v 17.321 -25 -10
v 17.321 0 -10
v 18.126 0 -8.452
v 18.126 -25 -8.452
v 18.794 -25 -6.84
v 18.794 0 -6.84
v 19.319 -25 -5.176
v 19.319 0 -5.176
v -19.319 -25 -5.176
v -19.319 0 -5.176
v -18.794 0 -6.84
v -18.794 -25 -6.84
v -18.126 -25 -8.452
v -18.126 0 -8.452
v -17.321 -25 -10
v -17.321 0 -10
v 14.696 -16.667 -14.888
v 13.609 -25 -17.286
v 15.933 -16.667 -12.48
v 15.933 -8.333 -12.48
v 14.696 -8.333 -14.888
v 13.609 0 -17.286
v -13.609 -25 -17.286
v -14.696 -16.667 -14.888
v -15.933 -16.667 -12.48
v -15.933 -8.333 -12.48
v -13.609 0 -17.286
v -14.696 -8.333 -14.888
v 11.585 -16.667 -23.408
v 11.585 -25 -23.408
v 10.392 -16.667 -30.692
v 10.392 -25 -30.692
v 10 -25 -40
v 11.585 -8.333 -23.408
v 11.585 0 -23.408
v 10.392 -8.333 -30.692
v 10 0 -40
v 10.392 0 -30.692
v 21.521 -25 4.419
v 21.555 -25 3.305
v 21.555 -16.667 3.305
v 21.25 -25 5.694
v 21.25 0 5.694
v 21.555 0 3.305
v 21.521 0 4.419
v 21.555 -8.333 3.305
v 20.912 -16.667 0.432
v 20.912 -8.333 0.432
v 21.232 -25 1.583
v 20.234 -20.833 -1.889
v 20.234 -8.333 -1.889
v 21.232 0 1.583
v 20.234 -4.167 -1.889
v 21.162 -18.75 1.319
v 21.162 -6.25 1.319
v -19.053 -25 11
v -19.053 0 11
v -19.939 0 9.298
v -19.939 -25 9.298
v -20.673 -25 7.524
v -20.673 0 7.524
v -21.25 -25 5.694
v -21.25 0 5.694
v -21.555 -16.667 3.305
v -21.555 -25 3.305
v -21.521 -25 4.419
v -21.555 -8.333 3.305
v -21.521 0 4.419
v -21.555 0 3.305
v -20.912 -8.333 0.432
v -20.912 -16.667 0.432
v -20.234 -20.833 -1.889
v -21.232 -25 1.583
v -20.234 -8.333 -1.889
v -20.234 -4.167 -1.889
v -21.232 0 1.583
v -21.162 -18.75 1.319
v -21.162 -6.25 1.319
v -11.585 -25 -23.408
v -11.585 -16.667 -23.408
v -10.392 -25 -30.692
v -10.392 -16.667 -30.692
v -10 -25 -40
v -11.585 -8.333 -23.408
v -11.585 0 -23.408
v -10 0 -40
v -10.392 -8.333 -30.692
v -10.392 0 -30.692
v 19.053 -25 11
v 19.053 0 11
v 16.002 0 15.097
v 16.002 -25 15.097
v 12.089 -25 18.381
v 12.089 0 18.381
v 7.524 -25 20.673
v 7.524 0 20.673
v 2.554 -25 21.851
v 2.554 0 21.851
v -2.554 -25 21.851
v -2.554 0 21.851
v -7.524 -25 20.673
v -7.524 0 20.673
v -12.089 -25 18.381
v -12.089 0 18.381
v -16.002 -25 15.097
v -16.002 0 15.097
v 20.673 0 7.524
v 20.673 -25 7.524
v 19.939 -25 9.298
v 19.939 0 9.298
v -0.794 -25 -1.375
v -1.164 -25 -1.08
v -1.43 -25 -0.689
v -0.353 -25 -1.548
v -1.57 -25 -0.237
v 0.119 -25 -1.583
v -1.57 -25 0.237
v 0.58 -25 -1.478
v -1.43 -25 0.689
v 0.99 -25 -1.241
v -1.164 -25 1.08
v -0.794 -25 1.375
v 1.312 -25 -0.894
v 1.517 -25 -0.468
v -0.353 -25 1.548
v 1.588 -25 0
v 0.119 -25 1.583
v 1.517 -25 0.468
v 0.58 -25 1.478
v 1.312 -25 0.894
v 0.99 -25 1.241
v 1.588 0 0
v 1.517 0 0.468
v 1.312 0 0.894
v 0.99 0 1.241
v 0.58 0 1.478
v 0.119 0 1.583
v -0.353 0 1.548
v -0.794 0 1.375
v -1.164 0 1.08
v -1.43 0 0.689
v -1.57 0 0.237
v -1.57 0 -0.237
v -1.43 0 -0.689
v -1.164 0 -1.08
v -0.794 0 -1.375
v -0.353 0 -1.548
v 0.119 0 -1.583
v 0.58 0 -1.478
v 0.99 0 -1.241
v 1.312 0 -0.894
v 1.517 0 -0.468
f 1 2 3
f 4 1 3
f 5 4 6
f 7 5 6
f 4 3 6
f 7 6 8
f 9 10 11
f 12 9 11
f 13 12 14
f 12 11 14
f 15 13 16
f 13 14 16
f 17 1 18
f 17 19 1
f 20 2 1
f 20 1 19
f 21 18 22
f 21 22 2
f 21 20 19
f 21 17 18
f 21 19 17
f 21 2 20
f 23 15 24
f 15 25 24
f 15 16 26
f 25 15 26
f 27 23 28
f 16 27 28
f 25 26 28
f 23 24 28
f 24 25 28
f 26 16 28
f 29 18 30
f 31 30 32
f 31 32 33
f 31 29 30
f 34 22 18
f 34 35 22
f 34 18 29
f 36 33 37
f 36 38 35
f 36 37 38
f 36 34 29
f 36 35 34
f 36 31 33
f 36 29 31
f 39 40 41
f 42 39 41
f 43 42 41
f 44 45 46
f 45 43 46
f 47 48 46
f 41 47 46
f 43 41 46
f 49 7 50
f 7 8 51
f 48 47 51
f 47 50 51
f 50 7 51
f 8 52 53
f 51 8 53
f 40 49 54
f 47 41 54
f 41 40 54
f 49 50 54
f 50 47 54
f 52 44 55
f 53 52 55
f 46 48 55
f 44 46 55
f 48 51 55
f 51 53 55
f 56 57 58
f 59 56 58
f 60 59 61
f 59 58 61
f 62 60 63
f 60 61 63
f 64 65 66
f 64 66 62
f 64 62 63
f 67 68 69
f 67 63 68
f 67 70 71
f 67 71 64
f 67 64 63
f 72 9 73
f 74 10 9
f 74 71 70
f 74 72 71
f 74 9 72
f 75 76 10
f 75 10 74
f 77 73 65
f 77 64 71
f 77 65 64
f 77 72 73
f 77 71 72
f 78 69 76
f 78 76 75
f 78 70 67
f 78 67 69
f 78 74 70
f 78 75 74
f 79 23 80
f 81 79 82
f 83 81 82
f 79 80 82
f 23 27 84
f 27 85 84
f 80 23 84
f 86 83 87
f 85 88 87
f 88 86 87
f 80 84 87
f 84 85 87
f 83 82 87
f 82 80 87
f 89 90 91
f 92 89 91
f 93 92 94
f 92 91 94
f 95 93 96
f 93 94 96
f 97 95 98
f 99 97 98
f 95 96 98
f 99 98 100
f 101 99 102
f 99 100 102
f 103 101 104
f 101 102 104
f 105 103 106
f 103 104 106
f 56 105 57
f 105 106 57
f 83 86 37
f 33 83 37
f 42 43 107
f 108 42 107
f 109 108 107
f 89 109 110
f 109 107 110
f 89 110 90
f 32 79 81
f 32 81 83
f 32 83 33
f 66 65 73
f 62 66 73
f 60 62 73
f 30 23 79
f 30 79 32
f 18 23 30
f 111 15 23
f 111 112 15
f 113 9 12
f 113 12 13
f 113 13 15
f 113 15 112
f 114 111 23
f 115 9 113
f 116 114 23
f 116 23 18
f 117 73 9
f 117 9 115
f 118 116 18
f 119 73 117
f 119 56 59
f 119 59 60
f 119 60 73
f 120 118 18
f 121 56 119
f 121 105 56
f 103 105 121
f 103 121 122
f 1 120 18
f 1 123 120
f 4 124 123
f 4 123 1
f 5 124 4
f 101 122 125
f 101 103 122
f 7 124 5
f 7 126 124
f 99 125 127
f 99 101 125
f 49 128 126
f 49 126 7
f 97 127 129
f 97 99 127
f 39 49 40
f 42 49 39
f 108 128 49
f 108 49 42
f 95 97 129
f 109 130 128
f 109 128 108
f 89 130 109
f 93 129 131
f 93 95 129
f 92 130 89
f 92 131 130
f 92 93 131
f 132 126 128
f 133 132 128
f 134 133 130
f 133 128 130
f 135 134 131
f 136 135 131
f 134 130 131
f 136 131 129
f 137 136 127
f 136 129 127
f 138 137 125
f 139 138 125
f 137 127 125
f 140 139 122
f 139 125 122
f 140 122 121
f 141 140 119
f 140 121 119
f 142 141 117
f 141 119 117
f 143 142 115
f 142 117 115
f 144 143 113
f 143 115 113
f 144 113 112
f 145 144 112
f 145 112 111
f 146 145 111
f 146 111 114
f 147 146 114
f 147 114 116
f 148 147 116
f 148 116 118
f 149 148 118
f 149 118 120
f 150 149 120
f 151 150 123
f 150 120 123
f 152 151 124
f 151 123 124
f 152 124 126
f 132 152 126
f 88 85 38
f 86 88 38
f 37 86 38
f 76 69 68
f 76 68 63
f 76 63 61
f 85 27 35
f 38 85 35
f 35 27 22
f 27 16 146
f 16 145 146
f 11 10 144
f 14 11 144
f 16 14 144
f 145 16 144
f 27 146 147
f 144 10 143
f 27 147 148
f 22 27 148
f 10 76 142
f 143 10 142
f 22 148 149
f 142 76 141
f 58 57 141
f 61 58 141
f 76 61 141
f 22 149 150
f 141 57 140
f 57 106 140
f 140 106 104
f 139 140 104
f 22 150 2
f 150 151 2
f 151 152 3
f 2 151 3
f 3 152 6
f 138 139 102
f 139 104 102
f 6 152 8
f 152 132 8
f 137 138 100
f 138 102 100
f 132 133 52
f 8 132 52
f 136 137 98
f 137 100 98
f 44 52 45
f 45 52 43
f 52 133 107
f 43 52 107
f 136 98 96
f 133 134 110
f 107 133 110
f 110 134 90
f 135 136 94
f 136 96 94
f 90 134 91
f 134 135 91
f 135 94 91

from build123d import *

# Parameters (mm, degrees)
F1_DEPTH = 25
F2_R     = 1.5875
F3_DEPTH = 25


with BuildPart() as f1:
    # F0 (on Front) → F1 (new body)
    with BuildSketch(Plane.XZ):
        with BuildLine():
            Line((-17.3205080757, 10), (0, 0))
            Line((0, 0), (17.3205080757, 10))
            ThreePointArc((17.3205080757, 10), (0, 20), (-17.3205080757, 10))
        make_face()
        with BuildLine():
            ThreePointArc((19.0525588833, 11), (0, 22), (-19.0525588833, 11))
            Line((-19.0525588833, 11), (-17.3205080757, 10))
            ThreePointArc((-17.3205080757, 10), (0, 20), (17.3205080757, 10))
            Line((17.3205080757, 10), (19.0525588833, 11))
        make_face()
        with BuildLine():
            Line((19.3185165258, 5.1763809021), (21.2503681784, 5.6940189923))
            ThreePointArc((21.2503681784, 5.6940189923), (20.3253497152, 8.419035512), (19.0525588833, 11))
            Line((19.0525588833, 11), (17.3205080757, 10))
            ThreePointArc((17.3205080757, 10), (18.4775906502, 7.6536686473), (19.3185165258, 5.1763809021))
        make_face()
        with BuildLine():
            Line((17.3205080757, 10), (0, 0))
            Line((0, 0), (19.3185165258, 5.1763809021))
            ThreePointArc((19.3185165258, 5.1763809021), (18.4775906502, 7.6536686473), (17.3205080757, 10))
        make_face()
        with BuildLine():
            Line((0, 0), (19.3185165258, -5.1763809021))
            ThreePointArc((19.3185165258, -5.1763809021), (19.8288972275, -2.6105238444), (20, 0))
            ThreePointArc((20, 0), (19.8288972275, 2.6105238444), (19.3185165258, 5.1763809021))
            Line((19.3185165258, 5.1763809021), (0, 0))
        make_face()
        with BuildLine():
            add(Edge.make_bspline(
                [(19.3185165258, -5.1763809021), (21.3890688866, 2.5510257083), (22.0268253137, 2.7962415134), (21.2503681784, 5.6940189923)],
                knots=[0, 0, 0, 0, 11.0407266369, 11.0407266369, 11.0407266369, 11.0407266369], degree=3))
            Line((21.2503681784, 5.6940189923), (19.3185165258, 5.1763809021))
            ThreePointArc((19.3185165258, 5.1763809021), (19.8288972275, 2.6105238444), (20, 0))
            ThreePointArc((20, 0), (19.8288972275, -2.6105238444), (19.3185165258, -5.1763809021))
        make_face()
        with BuildLine():
            Line((0, 0), (17.3205080757, -10))
            ThreePointArc((17.3205080757, -10), (18.4775906502, -7.6536686473), (19.3185165258, -5.1763809021))
            Line((19.3185165258, -5.1763809021), (0, 0))
        make_face()
        with BuildLine():
            ThreePointArc((-17.3205080757, -10), (0, -20), (17.3205080757, -10))
            Line((17.3205080757, -10), (0, 0))
            Line((0, 0), (-17.3205080757, 10))
            ThreePointArc((-17.3205080757, 10), (-19.8288972275, 2.6105238444), (-19.3185165258, -5.1763809021))
            ThreePointArc((-19.3185165258, -5.1763809021), (-18.4775906502, -7.6536686473), (-17.3205080757, -10))
        make_face()
        with BuildLine():
            Line((-10, -40), (10, -40))
            add(Edge.make_bspline(
                [(13.6086616321, -17.2859575547), (11.1605636245, -23.1152490417), (10, -29.3919833148), (10, -40)],
                knots=[9.0417028431, 9.0417028431, 9.0417028431, 9.0417028431, 30.8802499745, 30.8802499745, 30.8802499745, 30.8802499745], degree=3))
            ThreePointArc((13.6086616321, -17.2859575547), (13.1773214563, -17.6169860997), (12.7379323807, -17.9372539332))
            ThreePointArc((12.7379323807, -17.9372539332), (-0.543681065, -21.9932810399), (-13.6086616321, -17.2859575547))
            add(Edge.make_bspline(
                [(-13.6086616321, -17.2859575547), (-11.1605636245, -23.1152490417), (-10, -29.3919833148), (-10, -40)],
                knots=[9.0417028431, 9.0417028431, 9.0417028431, 9.0417028431, 30.8802499745, 30.8802499745, 30.8802499745, 30.8802499745], degree=3))
        make_face()
        with BuildLine():
            add(Edge.make_bspline(
                [(-17.3205080757, -10), (-15.8565136374, -12.5357127491), (-14.6222352267, -14.8724855827), (-13.6086616321, -17.2859575547)],
                knots=[0, 0, 0, 0, 9.0417028431, 9.0417028431, 9.0417028431, 9.0417028431], degree=3))
            ThreePointArc((-13.6086616321, -17.2859575547), (-0.543681065, -21.9932810399), (12.7379323807, -17.9372539332))
            Line((12.7379323807, -17.9372539332), (17.3205080757, -10))
            ThreePointArc((17.3205080757, -10), (0, -20), (-17.3205080757, -10))
        make_face()
        with BuildLine():
            ThreePointArc((-19.0525588833, 11), (-20.3253497152, 8.419035512), (-21.2503681784, 5.6940189923))
            add(Edge.make_bspline(
                [(-19.3185165258, -5.1763809021), (-21.3890688866, 2.5510257083), (-22.0268253137, 2.7962415134), (-21.2503681784, 5.6940189923)],
                knots=[0, 0, 0, 0, 11.0407266369, 11.0407266369, 11.0407266369, 11.0407266369], degree=3))
            ThreePointArc((-19.3185165258, -5.1763809021), (-19.8288972275, 2.6105238444), (-17.3205080757, 10))
            Line((-17.3205080757, 10), (-19.0525588833, 11))
        make_face()
        with BuildLine():
            ThreePointArc((12.7379323807, -17.9372539332), (13.1773214563, -17.6169860997), (13.6086616321, -17.2859575547))
            add(Edge.make_bspline(
                [(17.3205080757, -10), (15.8565136374, -12.5357127491), (14.6222352267, -14.8724855827), (13.6086616321, -17.2859575547)],
                knots=[0, 0, 0, 0, 9.0417028431, 9.0417028431, 9.0417028431, 9.0417028431], degree=3))
            Line((17.3205080757, -10), (12.7379323807, -17.9372539332))
        make_face()
    extrude(amount=F1_DEPTH)

    # F2 (on face) → F3 (cut)
    with BuildSketch(Plane.XZ.offset(25)):
        Circle(F2_R)
    extrude(amount=-F3_DEPTH, mode=Mode.SUBTRACT)


solid = f1.part
